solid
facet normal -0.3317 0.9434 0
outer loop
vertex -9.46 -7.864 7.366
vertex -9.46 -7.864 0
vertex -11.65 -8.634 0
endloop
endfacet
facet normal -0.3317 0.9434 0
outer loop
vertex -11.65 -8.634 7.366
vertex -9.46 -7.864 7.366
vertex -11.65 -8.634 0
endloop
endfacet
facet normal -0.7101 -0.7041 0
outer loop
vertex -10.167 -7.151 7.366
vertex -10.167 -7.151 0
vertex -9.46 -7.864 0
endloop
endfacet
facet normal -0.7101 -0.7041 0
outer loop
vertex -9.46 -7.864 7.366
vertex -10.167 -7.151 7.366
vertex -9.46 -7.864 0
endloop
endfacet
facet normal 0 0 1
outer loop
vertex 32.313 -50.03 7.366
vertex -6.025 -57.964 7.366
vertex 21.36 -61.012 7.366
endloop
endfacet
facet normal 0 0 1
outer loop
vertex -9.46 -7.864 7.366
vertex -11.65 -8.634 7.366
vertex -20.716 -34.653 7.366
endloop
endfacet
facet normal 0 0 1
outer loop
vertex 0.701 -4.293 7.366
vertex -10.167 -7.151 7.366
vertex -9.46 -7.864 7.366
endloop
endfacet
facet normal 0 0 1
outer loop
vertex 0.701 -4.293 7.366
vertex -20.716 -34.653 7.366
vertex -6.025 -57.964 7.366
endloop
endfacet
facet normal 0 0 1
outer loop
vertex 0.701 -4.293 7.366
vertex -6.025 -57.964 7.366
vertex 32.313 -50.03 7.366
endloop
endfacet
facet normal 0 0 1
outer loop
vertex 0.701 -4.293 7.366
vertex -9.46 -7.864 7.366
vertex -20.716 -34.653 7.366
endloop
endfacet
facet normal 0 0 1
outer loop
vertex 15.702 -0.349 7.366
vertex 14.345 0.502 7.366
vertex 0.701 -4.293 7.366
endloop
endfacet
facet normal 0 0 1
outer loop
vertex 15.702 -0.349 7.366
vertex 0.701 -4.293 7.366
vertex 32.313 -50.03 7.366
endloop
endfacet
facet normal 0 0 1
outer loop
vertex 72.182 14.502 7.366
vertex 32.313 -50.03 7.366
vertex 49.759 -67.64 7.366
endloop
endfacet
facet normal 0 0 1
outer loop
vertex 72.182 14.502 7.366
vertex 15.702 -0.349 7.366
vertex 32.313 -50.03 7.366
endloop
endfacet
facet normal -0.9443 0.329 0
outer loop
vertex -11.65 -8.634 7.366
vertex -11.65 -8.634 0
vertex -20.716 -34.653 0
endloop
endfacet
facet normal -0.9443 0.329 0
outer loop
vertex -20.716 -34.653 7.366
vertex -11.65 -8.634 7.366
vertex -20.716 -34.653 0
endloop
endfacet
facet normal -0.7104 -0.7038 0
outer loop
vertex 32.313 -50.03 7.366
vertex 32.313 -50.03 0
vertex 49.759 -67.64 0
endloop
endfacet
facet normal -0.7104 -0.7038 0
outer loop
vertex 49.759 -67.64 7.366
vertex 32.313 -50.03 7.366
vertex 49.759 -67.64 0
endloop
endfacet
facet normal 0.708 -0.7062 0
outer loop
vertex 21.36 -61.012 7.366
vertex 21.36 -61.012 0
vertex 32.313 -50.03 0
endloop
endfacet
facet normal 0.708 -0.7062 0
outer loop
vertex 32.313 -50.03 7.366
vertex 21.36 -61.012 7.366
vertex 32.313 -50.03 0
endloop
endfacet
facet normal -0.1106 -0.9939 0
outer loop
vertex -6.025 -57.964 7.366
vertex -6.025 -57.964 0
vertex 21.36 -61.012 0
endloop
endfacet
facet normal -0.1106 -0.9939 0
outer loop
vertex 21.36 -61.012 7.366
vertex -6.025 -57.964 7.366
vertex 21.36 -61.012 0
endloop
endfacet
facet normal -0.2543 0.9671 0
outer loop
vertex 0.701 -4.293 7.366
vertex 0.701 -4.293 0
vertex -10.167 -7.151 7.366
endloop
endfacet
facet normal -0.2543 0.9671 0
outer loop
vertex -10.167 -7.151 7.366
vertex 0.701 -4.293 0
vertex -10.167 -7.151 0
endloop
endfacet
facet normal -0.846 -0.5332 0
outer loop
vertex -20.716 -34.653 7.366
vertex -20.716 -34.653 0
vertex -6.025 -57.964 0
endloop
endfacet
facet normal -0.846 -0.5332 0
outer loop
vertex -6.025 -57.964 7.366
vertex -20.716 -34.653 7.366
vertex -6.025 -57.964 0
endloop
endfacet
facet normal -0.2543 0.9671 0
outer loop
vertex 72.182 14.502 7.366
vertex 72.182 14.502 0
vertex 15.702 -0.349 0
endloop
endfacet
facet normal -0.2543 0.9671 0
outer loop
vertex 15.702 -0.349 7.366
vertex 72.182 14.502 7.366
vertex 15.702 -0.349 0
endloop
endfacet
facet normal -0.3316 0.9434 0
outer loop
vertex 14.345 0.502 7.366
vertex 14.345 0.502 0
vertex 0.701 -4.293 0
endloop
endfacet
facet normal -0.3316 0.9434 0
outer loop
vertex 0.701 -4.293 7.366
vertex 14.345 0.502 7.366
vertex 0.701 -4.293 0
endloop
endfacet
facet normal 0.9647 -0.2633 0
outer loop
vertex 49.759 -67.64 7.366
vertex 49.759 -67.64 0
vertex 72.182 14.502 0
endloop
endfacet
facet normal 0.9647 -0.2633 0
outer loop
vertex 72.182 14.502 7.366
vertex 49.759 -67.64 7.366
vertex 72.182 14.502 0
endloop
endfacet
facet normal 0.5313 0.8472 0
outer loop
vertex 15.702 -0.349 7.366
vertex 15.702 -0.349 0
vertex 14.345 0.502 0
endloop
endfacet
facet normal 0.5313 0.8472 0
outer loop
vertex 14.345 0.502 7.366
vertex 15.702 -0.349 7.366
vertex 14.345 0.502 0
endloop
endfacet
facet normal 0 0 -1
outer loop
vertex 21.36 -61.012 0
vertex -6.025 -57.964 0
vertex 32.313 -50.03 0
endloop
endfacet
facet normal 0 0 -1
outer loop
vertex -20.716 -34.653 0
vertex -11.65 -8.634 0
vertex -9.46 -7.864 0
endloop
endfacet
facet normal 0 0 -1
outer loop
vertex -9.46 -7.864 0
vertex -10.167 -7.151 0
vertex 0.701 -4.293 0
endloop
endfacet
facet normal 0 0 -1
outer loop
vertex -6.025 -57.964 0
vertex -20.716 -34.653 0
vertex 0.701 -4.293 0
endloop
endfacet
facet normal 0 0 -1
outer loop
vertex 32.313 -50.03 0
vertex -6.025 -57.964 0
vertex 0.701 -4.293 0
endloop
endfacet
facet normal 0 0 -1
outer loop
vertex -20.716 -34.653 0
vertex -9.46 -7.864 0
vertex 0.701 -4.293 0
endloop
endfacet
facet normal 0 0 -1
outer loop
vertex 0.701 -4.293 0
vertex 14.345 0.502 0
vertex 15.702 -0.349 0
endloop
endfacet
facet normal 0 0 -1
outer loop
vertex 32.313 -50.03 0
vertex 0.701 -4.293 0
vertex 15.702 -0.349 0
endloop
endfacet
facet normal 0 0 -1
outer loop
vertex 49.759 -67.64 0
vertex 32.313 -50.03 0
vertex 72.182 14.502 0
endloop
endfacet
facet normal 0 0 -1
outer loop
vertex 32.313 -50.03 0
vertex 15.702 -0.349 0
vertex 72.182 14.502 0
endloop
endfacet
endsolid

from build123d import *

# Parameters (mm, degrees)
F1_DEPTH = 7.366


with BuildPart() as f1:
    # F0 (on Top) → F1 (new body)
    with BuildSketch(Plane.XY):
        Polygon((15.7023970503, -0.3485125312), (14.3449331899, 0.5018823129), (0.7010700917, -4.2930147397), align=None)
        Polygon((72.1815829965, 14.5023252855), (15.7023970503, -0.3485125312), (37.6951557319, -14.1260642838), (40.8171921849, -41.502378915), (32.3127703641, -50.0298144352), (49.7593244376, -67.6403014412), align=None)
        Polygon((37.6951557319, -14.1260642838), (15.7023970503, -0.3485125312), (0.7010700917, -4.2930147397), (-9.4604333978, -7.8640974148), (32.3127703641, -50.0298144352), (40.8171921849, -41.502378915), align=None)
        Polygon((-9.4604333978, -7.8640974148), (0.7010700917, -4.2930147397), (-10.1671477618, -7.1507425556), align=None)
        Polygon((32.3127703641, -50.0298144352), (-9.4604333978, -7.8640974148), (-11.6502816094, -8.633681268), (-20.7155617162, -34.6534893185), (-6.0245663122, -57.9640956692), (21.3600854217, -61.0121382883), align=None)
    extrude(amount=F1_DEPTH)


solid = f1.part
